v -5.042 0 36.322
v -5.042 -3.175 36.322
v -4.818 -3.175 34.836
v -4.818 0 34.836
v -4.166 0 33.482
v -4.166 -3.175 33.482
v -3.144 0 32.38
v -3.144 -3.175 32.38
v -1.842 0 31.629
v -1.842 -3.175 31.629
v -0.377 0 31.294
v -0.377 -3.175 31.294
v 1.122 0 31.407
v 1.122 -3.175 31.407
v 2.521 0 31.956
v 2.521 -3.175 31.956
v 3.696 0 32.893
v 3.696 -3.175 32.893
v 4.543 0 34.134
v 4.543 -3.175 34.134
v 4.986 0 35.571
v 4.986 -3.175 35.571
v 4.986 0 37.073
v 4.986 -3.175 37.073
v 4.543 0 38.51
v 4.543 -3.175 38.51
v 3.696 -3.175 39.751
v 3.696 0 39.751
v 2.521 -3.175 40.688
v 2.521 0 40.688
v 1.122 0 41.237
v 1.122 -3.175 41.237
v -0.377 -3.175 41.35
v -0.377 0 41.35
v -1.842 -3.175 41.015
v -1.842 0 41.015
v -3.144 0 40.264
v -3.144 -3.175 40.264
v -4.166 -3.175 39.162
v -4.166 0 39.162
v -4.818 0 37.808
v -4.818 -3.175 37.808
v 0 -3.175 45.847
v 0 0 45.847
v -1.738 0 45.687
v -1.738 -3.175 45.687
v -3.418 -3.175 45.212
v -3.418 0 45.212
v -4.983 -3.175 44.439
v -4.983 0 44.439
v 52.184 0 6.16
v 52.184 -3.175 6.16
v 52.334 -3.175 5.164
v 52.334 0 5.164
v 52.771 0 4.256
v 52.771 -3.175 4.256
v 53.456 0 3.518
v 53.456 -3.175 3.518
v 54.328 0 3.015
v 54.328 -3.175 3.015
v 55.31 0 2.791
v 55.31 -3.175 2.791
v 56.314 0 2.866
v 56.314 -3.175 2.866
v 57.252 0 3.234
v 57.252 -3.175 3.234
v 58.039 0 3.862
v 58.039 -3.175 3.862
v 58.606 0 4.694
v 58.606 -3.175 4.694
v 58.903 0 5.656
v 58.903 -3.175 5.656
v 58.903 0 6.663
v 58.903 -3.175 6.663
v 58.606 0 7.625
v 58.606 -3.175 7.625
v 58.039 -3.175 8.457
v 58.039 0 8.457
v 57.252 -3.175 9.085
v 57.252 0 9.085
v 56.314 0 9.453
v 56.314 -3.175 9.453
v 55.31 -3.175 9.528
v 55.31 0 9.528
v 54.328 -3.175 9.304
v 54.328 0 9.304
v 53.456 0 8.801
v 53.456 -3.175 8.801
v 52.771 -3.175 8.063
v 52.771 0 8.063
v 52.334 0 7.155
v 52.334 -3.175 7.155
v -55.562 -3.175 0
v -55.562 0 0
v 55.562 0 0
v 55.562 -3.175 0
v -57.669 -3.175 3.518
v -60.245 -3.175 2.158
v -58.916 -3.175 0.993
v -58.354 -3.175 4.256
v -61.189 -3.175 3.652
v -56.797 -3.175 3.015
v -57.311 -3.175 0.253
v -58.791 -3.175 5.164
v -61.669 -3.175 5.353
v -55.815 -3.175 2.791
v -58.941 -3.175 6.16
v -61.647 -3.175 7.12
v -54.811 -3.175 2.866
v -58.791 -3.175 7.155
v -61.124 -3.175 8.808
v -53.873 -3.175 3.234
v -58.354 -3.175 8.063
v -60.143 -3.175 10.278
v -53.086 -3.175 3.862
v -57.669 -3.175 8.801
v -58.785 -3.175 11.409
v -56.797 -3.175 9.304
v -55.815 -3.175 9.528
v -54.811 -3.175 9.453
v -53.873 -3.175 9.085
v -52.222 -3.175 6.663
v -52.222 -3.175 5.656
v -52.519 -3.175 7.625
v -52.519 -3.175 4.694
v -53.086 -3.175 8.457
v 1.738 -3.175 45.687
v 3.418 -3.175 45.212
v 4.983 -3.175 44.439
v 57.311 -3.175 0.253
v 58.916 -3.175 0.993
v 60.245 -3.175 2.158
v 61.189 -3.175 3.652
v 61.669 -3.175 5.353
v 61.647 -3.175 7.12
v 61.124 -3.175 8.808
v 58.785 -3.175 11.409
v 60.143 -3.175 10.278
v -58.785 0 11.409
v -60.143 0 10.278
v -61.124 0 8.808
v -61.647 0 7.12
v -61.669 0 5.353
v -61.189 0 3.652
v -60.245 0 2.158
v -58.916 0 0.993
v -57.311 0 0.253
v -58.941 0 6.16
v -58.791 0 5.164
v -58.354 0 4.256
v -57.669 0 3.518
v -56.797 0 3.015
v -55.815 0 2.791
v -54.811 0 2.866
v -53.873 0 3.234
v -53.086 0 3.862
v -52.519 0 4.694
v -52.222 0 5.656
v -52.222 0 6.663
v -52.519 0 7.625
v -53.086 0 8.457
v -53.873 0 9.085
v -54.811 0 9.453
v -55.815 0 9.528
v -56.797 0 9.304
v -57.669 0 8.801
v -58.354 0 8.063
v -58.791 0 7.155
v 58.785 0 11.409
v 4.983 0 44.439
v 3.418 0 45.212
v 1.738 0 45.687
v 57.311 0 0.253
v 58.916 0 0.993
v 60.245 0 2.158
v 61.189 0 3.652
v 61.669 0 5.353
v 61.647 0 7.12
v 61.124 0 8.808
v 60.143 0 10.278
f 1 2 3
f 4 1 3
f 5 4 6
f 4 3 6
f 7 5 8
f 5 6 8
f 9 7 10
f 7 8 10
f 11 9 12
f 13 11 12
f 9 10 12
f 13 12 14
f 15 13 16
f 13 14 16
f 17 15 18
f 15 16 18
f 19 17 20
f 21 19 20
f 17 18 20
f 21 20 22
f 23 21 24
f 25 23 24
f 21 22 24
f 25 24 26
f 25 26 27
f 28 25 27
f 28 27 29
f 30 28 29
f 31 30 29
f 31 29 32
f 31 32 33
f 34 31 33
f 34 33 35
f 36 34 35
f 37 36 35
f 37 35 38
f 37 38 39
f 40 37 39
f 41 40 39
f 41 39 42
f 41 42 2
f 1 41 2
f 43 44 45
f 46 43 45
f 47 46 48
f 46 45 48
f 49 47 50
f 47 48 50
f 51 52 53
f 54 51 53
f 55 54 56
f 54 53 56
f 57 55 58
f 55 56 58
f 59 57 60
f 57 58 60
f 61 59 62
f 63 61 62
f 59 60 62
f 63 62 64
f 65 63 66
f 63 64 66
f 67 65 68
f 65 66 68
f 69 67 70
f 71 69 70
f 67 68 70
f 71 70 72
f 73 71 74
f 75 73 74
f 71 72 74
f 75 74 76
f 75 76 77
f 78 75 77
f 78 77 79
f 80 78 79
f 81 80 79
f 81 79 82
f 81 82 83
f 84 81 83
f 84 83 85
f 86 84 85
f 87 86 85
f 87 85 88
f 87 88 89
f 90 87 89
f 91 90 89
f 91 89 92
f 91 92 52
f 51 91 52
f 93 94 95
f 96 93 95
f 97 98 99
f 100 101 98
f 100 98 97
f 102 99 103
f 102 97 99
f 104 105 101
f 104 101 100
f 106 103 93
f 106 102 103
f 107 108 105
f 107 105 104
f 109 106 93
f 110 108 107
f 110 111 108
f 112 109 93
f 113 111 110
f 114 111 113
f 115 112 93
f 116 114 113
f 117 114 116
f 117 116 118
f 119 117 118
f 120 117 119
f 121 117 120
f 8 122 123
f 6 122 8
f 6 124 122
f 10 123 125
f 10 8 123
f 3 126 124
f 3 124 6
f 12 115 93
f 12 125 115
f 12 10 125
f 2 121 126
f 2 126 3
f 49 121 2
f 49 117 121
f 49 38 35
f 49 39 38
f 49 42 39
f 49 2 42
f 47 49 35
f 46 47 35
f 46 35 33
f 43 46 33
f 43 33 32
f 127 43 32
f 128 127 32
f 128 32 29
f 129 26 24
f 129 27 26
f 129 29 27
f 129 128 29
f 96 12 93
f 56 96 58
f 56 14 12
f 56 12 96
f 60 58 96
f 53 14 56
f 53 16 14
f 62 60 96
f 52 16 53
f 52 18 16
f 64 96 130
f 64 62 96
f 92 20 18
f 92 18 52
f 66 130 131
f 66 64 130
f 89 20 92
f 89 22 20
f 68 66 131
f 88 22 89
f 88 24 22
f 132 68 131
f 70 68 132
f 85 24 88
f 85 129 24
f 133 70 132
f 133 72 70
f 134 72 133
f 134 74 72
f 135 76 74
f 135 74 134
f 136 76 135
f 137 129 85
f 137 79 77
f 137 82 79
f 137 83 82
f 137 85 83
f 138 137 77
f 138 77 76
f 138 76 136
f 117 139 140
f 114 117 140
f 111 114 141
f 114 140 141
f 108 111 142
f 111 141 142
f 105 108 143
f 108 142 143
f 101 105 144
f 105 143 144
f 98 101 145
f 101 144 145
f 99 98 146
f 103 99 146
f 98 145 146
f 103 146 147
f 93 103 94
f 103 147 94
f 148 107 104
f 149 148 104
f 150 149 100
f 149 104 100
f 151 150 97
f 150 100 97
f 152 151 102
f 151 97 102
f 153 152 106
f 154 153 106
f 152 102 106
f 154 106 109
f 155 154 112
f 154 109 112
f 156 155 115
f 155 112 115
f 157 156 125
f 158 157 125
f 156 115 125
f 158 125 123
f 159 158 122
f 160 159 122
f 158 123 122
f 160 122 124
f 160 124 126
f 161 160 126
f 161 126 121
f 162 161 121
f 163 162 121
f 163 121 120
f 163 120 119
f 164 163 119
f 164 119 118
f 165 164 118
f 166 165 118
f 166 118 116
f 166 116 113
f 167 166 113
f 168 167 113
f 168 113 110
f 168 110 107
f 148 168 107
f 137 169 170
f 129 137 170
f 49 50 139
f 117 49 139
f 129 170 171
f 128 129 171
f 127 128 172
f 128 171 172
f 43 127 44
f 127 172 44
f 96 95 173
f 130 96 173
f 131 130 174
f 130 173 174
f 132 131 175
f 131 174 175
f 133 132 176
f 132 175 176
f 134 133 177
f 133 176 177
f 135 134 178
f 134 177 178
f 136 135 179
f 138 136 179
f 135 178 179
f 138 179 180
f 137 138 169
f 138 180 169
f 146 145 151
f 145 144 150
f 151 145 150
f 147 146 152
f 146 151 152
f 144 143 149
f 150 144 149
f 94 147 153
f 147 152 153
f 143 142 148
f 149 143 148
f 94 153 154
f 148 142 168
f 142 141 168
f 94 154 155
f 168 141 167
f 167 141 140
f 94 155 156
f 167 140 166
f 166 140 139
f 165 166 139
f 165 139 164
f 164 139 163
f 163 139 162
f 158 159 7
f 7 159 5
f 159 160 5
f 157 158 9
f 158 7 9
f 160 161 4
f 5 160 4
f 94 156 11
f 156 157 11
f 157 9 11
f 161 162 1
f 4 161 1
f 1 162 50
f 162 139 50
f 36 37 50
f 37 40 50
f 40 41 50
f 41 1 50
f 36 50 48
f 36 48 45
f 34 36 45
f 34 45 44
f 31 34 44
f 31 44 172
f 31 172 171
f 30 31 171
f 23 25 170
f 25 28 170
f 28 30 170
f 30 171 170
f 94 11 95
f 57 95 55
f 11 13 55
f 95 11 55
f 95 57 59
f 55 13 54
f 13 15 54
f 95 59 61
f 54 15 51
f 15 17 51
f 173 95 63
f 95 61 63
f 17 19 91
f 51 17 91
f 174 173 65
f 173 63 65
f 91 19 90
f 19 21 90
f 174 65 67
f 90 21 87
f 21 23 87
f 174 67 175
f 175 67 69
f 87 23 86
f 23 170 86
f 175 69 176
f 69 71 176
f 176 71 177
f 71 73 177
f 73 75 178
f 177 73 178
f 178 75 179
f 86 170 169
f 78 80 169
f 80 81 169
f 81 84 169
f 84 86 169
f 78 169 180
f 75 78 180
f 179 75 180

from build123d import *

# Parameters (mm, degrees)
F1_DEPTH = 3.175
F2_D     = 10.0838
F3_D     = 6.7564


with BuildPart() as f1:
    # F0 (on Front) → F1 (new body)
    with BuildSketch(Plane.XZ):
        with BuildLine():
            Line((-4.9834776765, 44.439300983), (-58.7851488975, 11.408687969))
            ThreePointArc((-58.7851488975, 11.408687969), (-61.490054873, 4.4851244515), (-55.5625, 0))
            Line((-55.5625, 0), (0, 0))
            Line((0, 0), (55.5625, 0))
            ThreePointArc((55.5625, 0), (61.490054873, 4.4851244515), (58.7851488975, 11.408687969))
            Line((58.7851488975, 11.408687969), (4.9834776765, 44.439300983))
            ThreePointArc((4.9834776765, 44.439300983), (2.589240539, 45.4883219686), (0, 45.847))
            ThreePointArc((0, 45.847), (-2.589240539, 45.4883219686), (-4.9834776765, 44.439300983))
        make_face()
    extrude(amount=F1_DEPTH)

    # F2 (through all)
    with Locations(Plane(origin=(0, 0, 0), x_dir=(1, 0, 0), z_dir=(0, 1, 0))):
        with Locations((0, -36.322)):
            Hole(F2_D / 2)

    # F3 (through all)
    with Locations(Plane(origin=(0, 0, 0), x_dir=(1, 0, 0), z_dir=(0, 1, 0))):
        with Locations((55.5625, -6.1595), (-55.5625, -6.1595)):
            Hole(F3_D / 2)


solid = f1.part
